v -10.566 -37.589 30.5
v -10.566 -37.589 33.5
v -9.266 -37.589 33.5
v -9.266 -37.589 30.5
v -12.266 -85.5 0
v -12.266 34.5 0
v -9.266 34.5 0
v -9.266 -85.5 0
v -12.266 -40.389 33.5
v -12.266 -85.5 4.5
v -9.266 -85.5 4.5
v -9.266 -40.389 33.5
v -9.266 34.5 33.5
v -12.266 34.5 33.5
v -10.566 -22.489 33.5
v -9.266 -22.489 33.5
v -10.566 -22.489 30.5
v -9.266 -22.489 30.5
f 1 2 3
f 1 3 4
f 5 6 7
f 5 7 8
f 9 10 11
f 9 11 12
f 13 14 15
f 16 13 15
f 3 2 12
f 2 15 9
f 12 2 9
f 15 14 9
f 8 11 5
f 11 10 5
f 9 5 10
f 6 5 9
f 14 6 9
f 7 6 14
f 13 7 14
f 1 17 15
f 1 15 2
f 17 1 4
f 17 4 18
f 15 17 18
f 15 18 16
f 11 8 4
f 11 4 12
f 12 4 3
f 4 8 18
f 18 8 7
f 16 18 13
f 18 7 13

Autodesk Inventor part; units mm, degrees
ref_plane "YZ Plane" through (0, 0, 0) normal (1, 0, 0) x (0, 1, 0)
ref_plane "XZ Plane" through (0, 0, 0) normal (0, 1, 0) x (-1, 0, 0)
ref_plane "XY Plane" through (0, 0, 0) normal (0, 0, 1) x (1, 0, 0)
ref_plane "Work Plane4" through (-12.2663, 34.5, -3) normal (-1, 0, 0) x (0, 0, 1)
sketch "Sketch4" plane through (-12.2663, 34.5, -3) normal (-1, 0, 0) x (0, 0, 1)
  line L0 (0, 0) -> (0, -108) projected
  line L1 (0, -108) -> (3, -108) projected
  line L2 (3, 0) -> (3, -108) projected
  line L3 (0, 0) -> (3, 0) projected
  circle A0 centre (13.5, 27.5) radius 25 projected
  line L4 (7.5, -120) -> (3, -120) projected
  line L5 (3, -120) -> (3, -124) projected
  line L6 (3, -124) -> (-0.5, -124) projected
  line L7 (-0.5, -124) -> (-0.5, -138) projected
  line L8 (-0.5, -138) -> (8.5, -124) projected
  line L9 (8.5, -124) -> (7.5, -124) projected
  line L10 (7.5, -124) -> (7.5, -120) projected
  line L11 (0, -111) -> (3, -111) projected
  line L12 (0, -111) -> (0, -124) projected
  line L13 (0, -124) -> (3, -124) projected
  line L14 (3, -111) -> (3, -124) projected
  line L15 (3, -111) -> (3, -108) projected
  line L16 (0, -108) -> (0, -111) projected
  line L17 (7.5, -120) -> (3, -120)
  line L18 (3, -120) -> (3, 0)
  line L19 (3, 0) -> (36.5, 0)
  line L20 (8.5, -124) -> (66.1149, -34.3768)
  line L21 (7.5, -120) -> (63.7229, -32.5421)
  line L22 (36.5, 0) -> (36.5, -74.8889)
  line L23 (36.5, -72.0889) -> (33.5, -72.0889)
  line L24 (33.5, -72.0889) -> (33.5, -56.9889)
  line L25 (33.5, -56.9889) -> (36.5, -56.9889)
  line L26 (36.5, -56.9889) -> (36.5, -72.0889)
  point P0 (3, -34.5)
  point P1 (38.5, 27.5)
  point P2 (36.5, -56.9889)
  dimension "d4" = 25
  dimension "d5" = 2
  dimension "d9" = 2.8
  dimension "d10" = 15.1
  dimension "d11" = 3
extrude "Extrusion1" add sketch "Sketch4" against normal blind 3 contours L19 L22 L25 L24 L23 L21 L4 L14 L15 L2
sketch "Sketch8" plane through (-12.2663, -37.5889, 30.5) normal (0, 0, 1) x (1, 0, 0)
  line L0 (22.5, 14.9) -> (2, 14.9) projected
  line L1 (1.9, 14.8) -> (1.9, 0.3) projected
  line L2 (2, 0.2) -> (22.5, 0.2) projected
  line L3 (0, 0) -> (0, 15.1) projected
  line L4 (0, 0) -> (3, 0) projected
  line L5 (3, 15.1) -> (3, 0) projected
  line L6 (0, 15.1) -> (3, 15.1) projected
  line L7 (0, -2.8) -> (0, 0) projected
  line L8 (0, -2.8) -> (3, -2.8) projected
  line L9 (3, 0) -> (3, -2.8) projected
  line L10 (0, 0) -> (3, 0) projected
  line L11 (0, 15.1) -> (0, 72.0889) projected
  line L12 (0, 15.1) -> (3, 15.1) projected
  line L13 (3, 72.0889) -> (3, 15.1) projected
  line L14 (0, 72.0889) -> (3, 72.0889) projected
  line L15 (0, 15.1) -> (1.7, 15.1)
  line L16 (1.7, 15.1) -> (1.7, 0)
  line L17 (1.7, 0) -> (0, 0)
  line L18 (0, 0) -> (0, 15.1)
  point P0 (12.2663, 37.5889)
  point P1 (1.7, 0)
  point P2 (1.7, 15.1)
  dimension "d12" = 0.2
extrude "Extrusion2" add sketch "Sketch8" along normal up to surface (3 mm away) contours L3 L6 L16 L4
properties part number "right_side"
